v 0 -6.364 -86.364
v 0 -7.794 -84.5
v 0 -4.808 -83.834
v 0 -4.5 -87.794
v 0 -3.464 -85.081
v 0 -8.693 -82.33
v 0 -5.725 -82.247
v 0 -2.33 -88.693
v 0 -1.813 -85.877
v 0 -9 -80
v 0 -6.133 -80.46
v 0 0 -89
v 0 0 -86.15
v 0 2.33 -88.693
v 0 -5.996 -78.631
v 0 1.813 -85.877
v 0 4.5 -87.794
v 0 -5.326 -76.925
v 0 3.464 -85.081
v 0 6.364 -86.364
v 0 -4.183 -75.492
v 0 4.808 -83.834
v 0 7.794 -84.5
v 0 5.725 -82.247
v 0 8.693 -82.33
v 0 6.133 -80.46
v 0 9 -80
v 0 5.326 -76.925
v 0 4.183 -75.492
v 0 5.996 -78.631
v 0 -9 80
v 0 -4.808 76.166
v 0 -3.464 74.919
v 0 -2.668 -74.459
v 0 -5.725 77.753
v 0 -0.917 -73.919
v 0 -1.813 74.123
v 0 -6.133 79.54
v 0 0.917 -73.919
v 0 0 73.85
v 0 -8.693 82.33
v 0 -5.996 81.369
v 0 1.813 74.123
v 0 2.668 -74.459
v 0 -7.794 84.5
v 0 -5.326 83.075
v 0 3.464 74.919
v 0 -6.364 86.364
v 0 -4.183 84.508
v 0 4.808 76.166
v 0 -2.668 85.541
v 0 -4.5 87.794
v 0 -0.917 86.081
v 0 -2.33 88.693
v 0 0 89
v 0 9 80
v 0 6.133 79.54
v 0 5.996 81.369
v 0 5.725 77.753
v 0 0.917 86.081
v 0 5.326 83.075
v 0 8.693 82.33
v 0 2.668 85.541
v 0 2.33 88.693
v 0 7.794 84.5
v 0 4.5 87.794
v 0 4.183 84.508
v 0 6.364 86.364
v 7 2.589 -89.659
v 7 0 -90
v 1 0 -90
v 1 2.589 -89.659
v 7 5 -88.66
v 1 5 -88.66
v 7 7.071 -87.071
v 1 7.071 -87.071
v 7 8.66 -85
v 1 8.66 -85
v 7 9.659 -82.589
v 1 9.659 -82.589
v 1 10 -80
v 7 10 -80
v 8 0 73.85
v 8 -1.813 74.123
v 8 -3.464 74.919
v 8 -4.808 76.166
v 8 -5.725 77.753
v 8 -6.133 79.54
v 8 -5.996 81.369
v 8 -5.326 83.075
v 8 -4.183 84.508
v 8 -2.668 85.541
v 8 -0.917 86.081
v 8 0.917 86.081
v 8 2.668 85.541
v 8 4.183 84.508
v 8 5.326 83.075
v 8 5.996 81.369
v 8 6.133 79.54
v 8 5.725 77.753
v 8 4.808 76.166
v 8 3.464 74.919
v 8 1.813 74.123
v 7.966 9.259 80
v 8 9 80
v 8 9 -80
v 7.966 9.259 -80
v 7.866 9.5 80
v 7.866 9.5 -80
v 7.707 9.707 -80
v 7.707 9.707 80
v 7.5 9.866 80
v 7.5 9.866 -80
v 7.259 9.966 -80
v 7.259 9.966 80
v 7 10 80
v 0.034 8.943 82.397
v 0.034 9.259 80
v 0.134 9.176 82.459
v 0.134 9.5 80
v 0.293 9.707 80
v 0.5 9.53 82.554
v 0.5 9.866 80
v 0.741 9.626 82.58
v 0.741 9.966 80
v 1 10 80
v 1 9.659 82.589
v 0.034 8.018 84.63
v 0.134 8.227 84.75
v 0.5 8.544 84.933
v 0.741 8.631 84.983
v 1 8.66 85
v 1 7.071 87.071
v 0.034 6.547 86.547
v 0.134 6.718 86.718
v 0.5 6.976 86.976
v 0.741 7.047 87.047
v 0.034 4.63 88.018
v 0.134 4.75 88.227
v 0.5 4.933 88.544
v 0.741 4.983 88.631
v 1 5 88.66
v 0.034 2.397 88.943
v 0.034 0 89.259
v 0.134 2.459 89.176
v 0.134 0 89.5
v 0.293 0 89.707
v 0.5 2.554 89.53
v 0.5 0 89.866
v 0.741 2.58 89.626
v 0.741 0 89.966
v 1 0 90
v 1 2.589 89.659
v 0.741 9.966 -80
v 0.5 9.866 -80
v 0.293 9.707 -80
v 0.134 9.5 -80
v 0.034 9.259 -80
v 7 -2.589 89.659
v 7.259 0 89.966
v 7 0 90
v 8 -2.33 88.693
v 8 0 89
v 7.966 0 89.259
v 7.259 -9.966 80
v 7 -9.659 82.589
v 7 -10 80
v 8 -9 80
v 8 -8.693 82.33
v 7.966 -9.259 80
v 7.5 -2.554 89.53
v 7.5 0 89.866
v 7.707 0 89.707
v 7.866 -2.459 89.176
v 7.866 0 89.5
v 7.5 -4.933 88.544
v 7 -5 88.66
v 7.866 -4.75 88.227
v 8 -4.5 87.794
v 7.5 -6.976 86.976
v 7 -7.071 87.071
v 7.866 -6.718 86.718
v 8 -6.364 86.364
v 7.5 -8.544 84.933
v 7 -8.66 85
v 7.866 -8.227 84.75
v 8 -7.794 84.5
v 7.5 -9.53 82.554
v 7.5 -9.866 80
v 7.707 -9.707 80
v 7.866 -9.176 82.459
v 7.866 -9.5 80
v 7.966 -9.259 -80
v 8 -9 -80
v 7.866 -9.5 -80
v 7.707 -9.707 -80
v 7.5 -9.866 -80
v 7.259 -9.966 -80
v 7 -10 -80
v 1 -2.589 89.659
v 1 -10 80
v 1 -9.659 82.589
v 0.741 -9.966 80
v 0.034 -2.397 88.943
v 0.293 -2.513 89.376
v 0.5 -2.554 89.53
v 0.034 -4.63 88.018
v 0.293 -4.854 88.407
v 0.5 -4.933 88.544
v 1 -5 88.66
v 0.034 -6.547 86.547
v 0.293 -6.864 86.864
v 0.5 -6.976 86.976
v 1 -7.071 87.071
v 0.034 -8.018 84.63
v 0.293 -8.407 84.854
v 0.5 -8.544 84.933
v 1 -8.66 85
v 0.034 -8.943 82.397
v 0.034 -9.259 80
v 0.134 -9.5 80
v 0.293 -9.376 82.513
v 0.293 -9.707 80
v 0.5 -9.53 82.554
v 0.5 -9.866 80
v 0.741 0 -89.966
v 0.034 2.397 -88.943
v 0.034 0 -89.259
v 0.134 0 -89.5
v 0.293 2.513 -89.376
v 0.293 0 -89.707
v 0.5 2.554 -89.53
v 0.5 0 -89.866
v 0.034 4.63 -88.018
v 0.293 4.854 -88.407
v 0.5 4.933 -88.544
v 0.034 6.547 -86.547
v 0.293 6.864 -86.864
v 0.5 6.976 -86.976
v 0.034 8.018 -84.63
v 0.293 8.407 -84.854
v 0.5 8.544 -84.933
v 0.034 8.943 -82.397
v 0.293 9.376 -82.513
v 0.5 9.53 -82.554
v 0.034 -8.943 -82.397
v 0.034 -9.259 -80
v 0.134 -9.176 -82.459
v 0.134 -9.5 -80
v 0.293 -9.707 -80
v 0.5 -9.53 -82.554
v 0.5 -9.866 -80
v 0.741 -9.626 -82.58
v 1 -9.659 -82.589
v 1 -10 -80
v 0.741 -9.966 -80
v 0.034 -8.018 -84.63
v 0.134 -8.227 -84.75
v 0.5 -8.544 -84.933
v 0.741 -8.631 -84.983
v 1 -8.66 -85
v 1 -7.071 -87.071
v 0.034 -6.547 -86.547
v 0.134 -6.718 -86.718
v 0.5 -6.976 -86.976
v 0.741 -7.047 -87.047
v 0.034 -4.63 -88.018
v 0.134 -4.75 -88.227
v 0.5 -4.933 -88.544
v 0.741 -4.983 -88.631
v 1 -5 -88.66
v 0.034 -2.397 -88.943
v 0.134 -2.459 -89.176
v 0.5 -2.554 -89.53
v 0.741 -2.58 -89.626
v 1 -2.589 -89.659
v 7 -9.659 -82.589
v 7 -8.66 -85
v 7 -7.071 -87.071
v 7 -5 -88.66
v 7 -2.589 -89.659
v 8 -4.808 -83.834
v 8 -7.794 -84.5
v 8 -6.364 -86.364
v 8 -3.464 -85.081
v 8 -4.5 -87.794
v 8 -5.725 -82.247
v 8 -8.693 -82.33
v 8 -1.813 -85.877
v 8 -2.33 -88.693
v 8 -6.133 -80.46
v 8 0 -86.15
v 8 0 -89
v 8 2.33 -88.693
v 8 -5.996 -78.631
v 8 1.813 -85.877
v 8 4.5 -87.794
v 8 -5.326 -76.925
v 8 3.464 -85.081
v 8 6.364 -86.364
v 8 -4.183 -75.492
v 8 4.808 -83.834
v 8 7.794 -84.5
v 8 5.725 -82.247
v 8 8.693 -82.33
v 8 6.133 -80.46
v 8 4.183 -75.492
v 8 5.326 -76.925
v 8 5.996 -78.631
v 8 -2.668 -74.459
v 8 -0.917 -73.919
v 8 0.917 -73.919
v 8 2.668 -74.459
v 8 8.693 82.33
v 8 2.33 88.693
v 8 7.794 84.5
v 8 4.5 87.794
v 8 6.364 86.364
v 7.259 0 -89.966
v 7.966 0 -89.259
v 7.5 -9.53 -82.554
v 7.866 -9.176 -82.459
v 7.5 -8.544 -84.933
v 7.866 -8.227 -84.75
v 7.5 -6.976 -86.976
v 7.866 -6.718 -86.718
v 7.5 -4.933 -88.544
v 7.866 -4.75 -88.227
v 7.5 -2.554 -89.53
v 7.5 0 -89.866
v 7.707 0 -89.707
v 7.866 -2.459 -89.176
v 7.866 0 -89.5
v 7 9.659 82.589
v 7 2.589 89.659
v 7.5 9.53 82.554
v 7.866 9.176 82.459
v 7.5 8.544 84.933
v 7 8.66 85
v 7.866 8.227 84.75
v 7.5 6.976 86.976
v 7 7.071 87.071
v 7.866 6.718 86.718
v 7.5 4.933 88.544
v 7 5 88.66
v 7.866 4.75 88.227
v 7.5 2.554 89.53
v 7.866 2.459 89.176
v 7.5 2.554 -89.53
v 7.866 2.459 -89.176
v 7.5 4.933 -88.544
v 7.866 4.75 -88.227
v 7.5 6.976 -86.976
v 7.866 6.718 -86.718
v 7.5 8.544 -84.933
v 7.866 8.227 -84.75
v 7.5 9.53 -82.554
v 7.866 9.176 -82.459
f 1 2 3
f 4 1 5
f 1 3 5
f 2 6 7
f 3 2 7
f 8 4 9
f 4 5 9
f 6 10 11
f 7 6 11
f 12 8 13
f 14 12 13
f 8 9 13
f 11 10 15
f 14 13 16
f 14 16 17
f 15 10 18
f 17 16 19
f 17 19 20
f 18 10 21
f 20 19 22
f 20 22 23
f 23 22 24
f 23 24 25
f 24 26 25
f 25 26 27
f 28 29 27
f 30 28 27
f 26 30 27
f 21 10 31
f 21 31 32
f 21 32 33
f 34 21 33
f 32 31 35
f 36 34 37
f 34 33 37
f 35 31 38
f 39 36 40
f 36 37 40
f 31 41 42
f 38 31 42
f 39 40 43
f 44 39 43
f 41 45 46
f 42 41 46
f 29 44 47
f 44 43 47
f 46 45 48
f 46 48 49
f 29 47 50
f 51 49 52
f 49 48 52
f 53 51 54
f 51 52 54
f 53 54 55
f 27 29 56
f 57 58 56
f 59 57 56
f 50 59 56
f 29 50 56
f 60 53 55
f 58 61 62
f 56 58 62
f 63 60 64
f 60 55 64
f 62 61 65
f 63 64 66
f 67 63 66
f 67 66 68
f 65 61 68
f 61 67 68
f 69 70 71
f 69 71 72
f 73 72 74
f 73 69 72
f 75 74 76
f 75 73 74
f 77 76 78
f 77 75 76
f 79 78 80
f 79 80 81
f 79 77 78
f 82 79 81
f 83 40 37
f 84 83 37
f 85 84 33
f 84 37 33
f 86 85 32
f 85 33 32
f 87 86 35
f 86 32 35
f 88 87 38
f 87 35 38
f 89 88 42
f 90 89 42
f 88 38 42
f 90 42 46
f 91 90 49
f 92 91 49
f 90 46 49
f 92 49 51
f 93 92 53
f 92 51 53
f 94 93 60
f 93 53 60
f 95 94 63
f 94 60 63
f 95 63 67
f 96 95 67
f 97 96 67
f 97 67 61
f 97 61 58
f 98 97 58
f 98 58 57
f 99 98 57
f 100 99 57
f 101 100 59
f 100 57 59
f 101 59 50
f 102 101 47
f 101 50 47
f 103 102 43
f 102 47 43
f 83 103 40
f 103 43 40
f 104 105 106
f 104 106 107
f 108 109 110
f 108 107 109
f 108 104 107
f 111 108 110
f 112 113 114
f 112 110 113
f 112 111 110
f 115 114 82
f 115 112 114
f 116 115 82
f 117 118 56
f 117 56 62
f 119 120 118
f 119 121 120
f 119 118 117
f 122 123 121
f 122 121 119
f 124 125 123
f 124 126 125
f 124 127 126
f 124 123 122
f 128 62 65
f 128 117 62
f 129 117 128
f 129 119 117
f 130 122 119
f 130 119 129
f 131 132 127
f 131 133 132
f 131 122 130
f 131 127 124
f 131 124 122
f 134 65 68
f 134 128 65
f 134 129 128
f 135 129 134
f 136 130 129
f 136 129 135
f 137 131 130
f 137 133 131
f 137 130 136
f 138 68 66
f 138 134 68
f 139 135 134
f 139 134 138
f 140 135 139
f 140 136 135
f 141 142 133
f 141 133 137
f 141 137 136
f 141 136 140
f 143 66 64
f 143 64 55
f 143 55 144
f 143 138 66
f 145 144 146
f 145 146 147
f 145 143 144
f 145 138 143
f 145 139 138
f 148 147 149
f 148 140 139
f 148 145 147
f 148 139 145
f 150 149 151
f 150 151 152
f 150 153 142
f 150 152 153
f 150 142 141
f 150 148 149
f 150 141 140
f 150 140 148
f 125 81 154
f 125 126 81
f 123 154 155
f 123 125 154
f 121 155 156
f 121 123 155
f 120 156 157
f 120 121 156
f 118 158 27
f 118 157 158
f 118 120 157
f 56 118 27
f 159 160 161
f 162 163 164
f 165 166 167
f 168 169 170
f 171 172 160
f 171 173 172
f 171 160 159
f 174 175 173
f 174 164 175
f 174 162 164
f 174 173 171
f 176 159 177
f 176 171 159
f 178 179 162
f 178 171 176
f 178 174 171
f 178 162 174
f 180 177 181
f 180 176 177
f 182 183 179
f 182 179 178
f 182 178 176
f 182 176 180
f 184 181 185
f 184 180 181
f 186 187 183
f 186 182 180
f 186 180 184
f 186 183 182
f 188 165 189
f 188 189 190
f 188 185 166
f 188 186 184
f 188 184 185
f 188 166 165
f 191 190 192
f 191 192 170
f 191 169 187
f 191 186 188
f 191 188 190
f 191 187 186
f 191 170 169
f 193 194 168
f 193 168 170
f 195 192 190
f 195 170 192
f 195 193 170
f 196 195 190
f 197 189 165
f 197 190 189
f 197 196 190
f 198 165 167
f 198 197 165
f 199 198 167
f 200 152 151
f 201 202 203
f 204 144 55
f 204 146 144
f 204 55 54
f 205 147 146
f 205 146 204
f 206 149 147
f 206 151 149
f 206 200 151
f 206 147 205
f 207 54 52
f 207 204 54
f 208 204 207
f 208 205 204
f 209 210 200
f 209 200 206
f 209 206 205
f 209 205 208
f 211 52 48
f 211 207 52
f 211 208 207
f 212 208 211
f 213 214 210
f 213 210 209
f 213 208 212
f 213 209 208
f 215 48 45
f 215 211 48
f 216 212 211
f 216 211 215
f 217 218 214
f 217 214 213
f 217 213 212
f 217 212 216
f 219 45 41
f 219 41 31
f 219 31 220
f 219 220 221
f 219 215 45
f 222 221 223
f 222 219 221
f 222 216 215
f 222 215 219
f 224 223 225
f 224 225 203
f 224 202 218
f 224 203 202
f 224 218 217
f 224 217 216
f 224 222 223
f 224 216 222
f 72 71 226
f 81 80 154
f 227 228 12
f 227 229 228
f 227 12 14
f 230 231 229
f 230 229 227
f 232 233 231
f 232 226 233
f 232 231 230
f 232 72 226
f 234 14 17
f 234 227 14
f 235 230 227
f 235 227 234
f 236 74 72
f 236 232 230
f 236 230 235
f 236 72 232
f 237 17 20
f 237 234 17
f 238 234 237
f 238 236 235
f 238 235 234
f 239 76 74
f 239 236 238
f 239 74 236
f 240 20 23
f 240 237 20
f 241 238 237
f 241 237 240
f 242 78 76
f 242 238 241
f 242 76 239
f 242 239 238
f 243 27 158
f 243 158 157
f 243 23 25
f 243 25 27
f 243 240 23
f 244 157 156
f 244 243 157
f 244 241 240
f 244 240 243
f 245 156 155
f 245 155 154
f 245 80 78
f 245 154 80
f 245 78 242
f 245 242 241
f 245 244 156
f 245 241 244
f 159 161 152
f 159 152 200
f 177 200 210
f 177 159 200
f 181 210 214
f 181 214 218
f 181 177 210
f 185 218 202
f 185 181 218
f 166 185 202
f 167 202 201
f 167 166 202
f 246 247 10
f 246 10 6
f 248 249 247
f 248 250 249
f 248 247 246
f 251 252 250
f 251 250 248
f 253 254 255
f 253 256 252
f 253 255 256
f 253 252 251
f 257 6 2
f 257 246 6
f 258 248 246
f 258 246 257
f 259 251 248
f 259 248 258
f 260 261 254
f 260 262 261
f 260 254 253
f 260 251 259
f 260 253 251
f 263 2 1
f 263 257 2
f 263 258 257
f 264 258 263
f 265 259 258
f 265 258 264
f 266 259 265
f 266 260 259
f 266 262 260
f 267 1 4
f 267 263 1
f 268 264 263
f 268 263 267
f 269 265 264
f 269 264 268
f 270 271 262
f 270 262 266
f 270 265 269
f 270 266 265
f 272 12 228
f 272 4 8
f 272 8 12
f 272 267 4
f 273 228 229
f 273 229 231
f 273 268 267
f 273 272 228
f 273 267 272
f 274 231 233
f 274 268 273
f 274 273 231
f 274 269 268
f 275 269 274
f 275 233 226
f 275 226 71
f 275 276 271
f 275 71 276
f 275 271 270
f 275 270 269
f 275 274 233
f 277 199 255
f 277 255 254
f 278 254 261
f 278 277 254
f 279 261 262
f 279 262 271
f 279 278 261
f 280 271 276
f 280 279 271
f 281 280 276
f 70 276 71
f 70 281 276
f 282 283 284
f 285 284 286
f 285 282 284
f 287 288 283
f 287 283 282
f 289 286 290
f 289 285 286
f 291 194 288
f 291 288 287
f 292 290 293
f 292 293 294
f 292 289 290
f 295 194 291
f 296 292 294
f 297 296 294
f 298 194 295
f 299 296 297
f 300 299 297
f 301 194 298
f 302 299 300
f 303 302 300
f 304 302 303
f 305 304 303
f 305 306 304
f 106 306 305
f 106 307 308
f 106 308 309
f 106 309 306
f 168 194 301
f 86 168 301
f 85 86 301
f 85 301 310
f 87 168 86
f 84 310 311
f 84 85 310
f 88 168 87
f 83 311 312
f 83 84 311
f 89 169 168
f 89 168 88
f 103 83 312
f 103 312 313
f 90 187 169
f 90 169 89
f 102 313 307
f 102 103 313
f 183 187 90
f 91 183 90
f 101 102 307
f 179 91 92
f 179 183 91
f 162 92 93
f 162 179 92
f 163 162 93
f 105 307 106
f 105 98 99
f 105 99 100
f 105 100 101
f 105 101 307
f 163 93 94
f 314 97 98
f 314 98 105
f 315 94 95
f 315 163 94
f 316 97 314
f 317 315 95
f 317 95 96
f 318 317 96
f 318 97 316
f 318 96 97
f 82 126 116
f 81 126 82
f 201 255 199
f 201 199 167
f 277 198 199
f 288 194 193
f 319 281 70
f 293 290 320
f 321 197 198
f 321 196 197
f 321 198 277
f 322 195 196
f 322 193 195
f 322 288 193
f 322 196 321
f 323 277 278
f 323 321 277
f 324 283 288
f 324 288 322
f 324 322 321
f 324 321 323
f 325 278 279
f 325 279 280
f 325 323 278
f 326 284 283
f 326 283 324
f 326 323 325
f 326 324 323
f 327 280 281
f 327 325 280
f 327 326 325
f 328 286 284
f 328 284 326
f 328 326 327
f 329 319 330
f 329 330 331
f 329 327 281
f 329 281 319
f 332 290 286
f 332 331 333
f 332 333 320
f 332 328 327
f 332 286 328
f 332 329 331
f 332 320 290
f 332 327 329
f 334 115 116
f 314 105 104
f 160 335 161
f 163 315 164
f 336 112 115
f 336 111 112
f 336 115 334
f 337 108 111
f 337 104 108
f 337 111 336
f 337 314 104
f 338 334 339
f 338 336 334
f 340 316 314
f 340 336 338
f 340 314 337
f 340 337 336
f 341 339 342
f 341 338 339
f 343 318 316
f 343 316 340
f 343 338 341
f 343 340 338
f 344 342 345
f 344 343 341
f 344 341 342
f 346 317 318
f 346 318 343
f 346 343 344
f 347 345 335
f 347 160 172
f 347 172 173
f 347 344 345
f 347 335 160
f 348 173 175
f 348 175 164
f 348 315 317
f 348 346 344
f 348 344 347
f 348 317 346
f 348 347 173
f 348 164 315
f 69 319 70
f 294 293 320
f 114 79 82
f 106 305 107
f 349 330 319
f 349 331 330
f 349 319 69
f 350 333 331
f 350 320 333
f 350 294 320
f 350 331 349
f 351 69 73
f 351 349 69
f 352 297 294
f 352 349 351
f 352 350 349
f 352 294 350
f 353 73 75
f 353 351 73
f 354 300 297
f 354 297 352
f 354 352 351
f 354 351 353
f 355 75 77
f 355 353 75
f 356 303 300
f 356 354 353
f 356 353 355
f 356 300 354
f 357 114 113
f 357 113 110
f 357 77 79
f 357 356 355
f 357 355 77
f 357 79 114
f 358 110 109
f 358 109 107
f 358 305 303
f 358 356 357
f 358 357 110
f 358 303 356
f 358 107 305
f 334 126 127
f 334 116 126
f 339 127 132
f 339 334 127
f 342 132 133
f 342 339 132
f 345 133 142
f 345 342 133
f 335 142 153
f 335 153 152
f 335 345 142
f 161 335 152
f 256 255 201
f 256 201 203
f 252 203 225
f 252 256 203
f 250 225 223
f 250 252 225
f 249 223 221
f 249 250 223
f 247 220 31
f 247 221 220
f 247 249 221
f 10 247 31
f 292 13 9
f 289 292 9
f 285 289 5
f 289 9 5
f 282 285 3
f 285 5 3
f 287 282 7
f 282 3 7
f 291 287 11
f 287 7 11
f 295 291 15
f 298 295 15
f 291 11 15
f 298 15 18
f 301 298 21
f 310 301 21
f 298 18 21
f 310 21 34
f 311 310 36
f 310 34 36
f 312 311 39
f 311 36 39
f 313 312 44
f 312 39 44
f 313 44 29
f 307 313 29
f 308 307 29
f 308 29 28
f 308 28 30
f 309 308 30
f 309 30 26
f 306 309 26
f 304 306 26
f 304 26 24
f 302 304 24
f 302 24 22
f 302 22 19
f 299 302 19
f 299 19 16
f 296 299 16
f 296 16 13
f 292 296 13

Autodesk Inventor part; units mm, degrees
ref_plane "YZ Plane" through (0, 0, 0) normal (1, 0, 0) x (0, 1, 0)
ref_plane "XZ Plane" through (0, 0, 0) normal (0, 1, 0) x (-1, 0, 0)
ref_plane "XY Plane" through (0, 0, 0) normal (0, 0, 1) x (1, 0, 0)
sketch "スケッチ1" plane through (0, 0, 0) normal (1, 0, 0) x (0, 1, 0)
  line L0 (10, -90) -> (-10, -90)
  line L1 (-10, -90) -> (-10, 90)
  line L2 (-10, 90) -> (10, 90)
  line L3 (10, 90) -> (10, -90)
  line L4 (10, -90) -> (-10, 90) construction
  line L5 (-10, -90) -> (10, 90) construction
  point P0 (0, 0)
  dimension "d0" = 180
  dimension "d1" = 20
extrude "押し出し1" add sketch "スケッチ1" along normal blind 8
sketch "スケッチ2" plane through (8, 0, 0) normal (1, 0, 0) x (0, 0, -1)
  line L0 (-90, 10) -> (-90, -10) projected
  line L1 (90, -10) -> (90, 10) projected
  point P0 (0, 0)
  point P1 (-80, 0)
  point P2 (80, 0)
  dimension "d4" = 10
  dimension "d14" = 10
hole "穴1" at (8, 0, 80) at (8, 0, -80) direction (-1, 0, 0) diameter 12.3 end through all
fillet "フィレット1" radius 10 4 edges at (4, 10, 90) (4, -10, 90) (4, 10, -90) (4, -10, -90)
fillet "フィレット2" radius 1 8 edges at (0, 7.0712, -87.0712) (0, 10, 0) (0, 7.0712, 87.0712) (0, -10, 0) (8, 7.0712, -87.0712) (8, 10, 0) (8, 7.0712, 87.0712) (8, -10, 0)
equation "\"d14\" = d4"
properties part number "base4" material "ABS プラスチック"
